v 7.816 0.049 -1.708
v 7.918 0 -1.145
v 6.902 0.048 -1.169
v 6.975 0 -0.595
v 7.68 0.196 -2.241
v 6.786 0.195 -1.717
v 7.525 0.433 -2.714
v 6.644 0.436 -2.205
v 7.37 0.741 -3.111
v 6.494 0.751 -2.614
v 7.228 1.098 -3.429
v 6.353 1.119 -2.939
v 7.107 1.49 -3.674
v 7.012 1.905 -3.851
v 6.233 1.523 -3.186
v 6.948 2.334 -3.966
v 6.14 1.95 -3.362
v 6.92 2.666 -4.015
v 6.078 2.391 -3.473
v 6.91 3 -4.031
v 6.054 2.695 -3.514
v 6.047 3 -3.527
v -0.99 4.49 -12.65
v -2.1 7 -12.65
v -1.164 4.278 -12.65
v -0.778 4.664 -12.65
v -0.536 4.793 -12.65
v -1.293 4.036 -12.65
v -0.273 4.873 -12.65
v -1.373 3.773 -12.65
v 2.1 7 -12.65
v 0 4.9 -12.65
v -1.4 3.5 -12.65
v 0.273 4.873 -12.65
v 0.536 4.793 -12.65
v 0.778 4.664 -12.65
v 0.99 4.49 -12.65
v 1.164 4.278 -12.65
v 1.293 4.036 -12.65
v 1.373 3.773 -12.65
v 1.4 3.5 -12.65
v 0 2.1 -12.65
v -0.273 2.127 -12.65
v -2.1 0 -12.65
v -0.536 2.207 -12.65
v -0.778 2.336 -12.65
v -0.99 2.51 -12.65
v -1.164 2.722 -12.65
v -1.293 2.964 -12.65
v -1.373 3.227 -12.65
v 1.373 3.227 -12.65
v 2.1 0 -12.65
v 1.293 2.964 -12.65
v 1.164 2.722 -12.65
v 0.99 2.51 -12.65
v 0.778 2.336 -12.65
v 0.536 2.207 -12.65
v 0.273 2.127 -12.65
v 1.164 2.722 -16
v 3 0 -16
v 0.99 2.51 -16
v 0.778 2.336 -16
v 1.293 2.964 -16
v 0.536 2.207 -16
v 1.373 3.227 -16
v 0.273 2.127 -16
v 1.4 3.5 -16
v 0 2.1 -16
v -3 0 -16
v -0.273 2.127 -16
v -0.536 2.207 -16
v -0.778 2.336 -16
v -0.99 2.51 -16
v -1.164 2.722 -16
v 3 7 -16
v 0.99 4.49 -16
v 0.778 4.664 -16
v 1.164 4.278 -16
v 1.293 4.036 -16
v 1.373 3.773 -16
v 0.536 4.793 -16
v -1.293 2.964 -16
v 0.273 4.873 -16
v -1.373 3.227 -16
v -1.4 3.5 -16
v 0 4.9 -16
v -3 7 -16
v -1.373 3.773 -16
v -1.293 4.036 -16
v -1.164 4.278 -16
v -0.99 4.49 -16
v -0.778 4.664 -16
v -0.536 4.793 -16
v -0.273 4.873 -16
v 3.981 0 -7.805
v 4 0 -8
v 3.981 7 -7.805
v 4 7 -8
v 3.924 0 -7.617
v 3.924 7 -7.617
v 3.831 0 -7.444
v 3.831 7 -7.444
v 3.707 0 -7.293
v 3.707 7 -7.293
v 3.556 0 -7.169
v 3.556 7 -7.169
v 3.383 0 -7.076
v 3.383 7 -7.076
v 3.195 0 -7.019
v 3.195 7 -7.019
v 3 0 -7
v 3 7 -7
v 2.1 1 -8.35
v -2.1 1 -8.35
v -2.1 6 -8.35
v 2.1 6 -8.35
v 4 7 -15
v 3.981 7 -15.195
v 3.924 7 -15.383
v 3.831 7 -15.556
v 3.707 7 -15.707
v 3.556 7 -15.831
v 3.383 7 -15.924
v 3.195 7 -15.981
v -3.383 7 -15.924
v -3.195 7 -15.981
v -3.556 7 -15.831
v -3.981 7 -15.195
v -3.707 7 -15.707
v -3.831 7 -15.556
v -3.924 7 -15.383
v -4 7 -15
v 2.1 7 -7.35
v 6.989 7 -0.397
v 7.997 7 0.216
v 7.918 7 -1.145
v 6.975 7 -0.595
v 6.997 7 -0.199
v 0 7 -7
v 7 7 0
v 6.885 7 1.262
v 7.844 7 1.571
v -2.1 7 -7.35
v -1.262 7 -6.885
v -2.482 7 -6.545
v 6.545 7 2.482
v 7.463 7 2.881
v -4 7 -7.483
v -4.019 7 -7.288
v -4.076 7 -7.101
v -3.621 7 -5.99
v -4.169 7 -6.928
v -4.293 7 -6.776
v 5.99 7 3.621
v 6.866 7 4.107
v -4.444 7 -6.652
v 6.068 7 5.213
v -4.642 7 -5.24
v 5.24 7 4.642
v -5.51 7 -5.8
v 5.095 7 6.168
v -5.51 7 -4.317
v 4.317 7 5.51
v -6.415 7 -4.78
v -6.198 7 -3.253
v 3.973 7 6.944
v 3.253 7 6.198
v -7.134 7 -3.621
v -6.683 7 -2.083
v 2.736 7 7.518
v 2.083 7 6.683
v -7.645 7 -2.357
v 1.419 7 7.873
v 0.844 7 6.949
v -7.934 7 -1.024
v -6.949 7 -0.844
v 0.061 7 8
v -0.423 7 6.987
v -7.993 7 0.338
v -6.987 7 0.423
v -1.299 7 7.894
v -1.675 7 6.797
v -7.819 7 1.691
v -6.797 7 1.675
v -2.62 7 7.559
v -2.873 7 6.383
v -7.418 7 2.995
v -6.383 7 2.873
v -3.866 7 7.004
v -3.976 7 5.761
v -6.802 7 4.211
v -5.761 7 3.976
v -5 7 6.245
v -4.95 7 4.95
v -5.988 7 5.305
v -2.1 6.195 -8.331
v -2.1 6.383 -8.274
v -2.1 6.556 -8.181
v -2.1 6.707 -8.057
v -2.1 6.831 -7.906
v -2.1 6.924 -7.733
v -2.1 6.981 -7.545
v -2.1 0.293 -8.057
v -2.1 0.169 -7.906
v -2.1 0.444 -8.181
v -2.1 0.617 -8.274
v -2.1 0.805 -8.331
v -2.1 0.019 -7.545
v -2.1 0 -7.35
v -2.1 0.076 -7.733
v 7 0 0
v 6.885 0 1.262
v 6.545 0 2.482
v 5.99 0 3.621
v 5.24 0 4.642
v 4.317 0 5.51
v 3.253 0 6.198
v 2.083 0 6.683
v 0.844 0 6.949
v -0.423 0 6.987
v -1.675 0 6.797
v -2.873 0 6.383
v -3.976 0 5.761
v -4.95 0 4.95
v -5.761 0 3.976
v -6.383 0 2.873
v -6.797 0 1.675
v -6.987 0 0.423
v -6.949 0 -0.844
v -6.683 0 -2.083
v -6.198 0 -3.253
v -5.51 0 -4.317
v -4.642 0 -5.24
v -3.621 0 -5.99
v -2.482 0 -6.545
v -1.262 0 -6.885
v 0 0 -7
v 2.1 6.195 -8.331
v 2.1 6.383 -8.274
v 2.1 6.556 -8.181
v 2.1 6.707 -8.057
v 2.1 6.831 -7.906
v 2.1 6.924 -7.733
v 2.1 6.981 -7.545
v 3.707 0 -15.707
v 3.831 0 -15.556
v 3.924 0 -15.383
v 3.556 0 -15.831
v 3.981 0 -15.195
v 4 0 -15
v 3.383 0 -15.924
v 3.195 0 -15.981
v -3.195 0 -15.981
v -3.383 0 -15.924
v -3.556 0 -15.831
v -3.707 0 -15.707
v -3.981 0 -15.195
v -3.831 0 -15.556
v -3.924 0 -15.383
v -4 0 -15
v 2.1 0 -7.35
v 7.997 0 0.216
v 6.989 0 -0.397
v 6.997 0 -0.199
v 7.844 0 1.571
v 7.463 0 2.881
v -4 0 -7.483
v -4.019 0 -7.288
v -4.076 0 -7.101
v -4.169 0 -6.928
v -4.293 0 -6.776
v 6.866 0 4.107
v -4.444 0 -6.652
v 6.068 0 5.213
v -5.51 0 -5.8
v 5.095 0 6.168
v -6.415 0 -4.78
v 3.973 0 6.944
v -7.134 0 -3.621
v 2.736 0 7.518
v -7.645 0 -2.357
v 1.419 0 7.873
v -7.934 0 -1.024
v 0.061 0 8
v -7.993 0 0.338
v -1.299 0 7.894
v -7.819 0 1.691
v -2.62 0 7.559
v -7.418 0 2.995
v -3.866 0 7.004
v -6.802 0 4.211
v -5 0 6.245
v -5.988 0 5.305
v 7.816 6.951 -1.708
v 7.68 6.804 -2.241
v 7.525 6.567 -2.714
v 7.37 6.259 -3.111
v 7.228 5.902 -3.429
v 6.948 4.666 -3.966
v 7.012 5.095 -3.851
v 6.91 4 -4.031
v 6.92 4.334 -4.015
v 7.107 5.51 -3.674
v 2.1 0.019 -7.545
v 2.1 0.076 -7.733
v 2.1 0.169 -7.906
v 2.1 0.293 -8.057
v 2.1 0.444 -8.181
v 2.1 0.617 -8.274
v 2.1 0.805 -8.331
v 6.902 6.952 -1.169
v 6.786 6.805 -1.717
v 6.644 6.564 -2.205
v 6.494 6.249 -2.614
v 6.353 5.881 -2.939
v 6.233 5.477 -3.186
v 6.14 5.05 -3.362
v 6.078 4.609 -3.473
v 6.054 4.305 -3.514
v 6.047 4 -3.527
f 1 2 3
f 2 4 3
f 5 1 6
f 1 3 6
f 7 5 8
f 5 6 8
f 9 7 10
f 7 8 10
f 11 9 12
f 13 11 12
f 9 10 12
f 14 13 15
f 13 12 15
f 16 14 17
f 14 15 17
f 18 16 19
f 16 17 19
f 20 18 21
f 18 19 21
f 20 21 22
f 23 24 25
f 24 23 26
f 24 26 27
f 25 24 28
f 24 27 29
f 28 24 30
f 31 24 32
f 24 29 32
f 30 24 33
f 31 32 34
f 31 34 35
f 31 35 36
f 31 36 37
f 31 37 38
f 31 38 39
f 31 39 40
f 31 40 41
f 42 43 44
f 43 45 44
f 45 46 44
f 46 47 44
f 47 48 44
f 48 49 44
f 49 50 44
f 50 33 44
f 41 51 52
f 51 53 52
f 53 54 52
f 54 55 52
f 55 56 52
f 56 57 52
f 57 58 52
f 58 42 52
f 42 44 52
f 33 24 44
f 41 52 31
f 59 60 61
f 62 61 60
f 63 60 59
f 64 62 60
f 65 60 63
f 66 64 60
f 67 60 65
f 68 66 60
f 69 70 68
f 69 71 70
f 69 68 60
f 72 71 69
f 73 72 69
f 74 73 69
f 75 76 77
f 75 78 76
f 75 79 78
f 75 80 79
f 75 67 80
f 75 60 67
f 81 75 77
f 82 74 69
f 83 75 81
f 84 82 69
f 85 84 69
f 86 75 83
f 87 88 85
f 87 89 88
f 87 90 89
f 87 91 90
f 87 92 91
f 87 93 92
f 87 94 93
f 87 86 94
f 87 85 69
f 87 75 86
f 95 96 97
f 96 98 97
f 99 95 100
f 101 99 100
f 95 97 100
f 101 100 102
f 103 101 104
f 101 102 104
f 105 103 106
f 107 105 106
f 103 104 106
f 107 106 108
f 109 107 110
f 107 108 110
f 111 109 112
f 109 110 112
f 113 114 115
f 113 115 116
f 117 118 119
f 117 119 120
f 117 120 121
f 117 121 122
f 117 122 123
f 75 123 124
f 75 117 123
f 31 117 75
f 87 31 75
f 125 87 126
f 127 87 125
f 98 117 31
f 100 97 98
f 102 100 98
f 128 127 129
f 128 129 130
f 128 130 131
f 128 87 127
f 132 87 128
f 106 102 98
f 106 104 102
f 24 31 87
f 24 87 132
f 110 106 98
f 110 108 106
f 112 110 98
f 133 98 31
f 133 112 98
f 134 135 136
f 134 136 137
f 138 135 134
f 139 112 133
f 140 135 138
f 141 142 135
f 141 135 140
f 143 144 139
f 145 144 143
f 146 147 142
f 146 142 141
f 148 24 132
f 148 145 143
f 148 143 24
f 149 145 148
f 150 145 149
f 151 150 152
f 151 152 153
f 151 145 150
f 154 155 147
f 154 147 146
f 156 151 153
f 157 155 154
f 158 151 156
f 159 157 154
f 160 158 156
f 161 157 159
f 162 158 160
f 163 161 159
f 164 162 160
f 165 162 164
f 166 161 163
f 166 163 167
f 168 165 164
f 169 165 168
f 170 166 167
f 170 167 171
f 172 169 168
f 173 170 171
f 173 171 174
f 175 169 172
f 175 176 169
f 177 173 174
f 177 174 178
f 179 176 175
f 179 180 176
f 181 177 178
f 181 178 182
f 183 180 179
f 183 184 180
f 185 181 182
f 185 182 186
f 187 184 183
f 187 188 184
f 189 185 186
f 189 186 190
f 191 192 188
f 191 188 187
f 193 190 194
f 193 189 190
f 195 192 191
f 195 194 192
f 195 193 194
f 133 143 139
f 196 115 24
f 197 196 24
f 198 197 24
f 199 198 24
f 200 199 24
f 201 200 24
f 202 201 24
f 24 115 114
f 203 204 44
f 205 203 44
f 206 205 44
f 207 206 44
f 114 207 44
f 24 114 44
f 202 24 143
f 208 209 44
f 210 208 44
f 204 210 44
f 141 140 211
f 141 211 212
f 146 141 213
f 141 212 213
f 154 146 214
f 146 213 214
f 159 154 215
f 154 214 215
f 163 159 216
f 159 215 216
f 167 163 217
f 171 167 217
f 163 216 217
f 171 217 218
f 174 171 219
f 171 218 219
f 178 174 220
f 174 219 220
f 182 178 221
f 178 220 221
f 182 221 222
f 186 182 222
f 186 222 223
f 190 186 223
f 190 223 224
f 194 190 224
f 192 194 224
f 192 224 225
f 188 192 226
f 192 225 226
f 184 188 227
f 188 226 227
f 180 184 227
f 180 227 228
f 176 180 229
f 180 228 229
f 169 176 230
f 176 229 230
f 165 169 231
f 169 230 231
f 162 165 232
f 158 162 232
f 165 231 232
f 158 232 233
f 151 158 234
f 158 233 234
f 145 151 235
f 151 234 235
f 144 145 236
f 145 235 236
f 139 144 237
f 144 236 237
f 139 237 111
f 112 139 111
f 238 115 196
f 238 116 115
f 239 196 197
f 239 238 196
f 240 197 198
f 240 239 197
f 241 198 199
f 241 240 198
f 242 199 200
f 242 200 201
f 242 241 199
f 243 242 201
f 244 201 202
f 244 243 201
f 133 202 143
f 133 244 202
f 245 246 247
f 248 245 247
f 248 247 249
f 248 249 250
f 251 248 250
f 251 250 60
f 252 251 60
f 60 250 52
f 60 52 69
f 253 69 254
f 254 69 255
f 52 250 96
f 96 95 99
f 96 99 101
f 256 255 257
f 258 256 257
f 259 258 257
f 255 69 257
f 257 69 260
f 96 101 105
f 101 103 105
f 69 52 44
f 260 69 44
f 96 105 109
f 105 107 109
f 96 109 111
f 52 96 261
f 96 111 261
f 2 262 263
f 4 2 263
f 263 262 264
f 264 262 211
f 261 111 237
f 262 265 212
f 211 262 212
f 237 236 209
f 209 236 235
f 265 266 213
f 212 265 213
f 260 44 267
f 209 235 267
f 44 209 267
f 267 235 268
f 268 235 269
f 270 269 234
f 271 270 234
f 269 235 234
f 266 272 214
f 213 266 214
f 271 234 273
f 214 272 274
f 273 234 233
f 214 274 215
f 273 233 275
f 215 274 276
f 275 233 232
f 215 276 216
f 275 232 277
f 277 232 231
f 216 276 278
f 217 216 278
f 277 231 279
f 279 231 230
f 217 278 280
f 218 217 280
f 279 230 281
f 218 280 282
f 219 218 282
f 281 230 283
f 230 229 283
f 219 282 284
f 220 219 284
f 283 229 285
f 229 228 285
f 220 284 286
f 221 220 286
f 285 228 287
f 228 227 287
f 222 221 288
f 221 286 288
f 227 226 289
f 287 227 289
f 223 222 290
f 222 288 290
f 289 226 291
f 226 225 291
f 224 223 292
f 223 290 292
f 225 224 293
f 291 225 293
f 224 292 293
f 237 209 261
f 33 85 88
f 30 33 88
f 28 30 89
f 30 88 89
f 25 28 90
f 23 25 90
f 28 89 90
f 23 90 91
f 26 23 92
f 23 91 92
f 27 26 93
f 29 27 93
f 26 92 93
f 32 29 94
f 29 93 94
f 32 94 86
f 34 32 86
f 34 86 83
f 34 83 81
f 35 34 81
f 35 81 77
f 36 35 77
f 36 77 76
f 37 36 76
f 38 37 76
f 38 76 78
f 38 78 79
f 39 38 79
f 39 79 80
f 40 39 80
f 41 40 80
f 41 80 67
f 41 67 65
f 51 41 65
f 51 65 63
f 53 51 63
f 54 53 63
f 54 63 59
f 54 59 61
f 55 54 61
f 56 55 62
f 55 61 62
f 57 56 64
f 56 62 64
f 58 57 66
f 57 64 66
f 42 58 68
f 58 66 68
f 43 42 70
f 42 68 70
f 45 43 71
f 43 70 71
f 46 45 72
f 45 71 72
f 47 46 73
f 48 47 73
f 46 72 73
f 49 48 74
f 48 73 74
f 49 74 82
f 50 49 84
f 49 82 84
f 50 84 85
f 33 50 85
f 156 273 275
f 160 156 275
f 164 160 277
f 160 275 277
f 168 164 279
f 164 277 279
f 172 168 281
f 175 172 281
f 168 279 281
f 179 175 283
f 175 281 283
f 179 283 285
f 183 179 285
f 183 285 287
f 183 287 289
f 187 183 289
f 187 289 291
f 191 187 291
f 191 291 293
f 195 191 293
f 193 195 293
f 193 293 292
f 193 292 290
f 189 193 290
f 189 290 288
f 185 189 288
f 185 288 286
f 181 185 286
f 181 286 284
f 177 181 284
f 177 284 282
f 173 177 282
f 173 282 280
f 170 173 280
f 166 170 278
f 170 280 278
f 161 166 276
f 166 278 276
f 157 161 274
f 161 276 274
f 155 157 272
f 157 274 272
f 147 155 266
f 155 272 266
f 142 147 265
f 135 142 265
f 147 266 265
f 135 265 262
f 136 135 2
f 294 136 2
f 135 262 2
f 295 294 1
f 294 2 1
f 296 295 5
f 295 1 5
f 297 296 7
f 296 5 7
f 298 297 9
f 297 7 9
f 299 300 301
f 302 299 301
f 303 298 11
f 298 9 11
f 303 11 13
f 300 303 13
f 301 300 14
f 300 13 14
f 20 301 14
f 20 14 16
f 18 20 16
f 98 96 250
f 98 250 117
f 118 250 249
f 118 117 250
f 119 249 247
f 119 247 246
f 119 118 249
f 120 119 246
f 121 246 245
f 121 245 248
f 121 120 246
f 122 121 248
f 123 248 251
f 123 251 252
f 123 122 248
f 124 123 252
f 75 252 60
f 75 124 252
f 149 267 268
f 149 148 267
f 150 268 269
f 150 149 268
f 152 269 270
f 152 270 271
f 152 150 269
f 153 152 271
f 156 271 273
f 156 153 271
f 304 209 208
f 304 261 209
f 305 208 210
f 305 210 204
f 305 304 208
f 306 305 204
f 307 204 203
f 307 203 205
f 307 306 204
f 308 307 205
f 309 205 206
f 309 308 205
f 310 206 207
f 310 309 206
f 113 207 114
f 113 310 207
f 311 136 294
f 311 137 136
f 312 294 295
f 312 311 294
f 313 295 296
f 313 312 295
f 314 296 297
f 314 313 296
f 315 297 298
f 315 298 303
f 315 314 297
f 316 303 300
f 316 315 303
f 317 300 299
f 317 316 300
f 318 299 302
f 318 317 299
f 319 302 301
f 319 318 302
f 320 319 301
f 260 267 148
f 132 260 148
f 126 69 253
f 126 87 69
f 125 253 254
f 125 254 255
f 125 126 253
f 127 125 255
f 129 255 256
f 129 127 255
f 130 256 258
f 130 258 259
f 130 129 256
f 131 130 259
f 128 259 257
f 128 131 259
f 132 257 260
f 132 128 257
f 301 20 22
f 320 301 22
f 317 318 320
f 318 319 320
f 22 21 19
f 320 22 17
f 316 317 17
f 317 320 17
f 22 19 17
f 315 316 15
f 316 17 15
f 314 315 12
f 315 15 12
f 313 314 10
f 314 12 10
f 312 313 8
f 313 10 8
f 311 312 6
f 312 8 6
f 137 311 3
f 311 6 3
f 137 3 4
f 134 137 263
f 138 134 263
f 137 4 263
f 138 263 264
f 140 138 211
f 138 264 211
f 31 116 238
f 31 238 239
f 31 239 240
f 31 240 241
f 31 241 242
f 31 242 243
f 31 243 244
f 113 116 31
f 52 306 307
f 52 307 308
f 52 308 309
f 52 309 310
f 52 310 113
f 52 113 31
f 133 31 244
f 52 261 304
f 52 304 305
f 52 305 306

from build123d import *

# Parameters (mm, degrees)
SKETCH1_W           = 4.2
SKETCH1_H           = 4.3
BOSS_EXTRUDE1_DEPTH = 7
FILLET1_R           = 1
FILLET2_R           = 3
FILLET3_R           = 1
SKETCH3_W           = 8
SKETCH3_H           = 7
BOSS_EXTRUDE2_DEPTH = 2
SKETCH2_R           = 1.4
CUT_EXTRUDE2_DEPTH  = 4
FILLET4_R           = 1


with BuildPart() as part:
    # Sketch1 → Boss-Extrude1 (new body)
    # profile 1 of 2: a face of its own
    with BuildSketch(Plane(origin=(0, 0, 0), x_dir=(1, 0, 0), z_dir=(0, 1, 0))):
        with BuildLine():
            ThreePointArc((7, 0), (-4.949747468, -4.949747468), (0, 7))
            Line((0, 7), (3.872983346, 7))
            Line((3.872983346, 7), (4, 7))
            Line((4, 7), (4, 14))
            Line((4, 14), (-4, 14))
            Line((-4, 14), (-4, 7))
            Line((-4, 7), (-3.872983346, 7))
            ThreePointArc((-3.872983346, 7), (-3.936655355, 6.964391188), (-4, 6.92820323))
            ThreePointArc((-4, 6.92820323), (-2.053343481, -7.73199719), (6.910323964, 4.030809189))
            Line((6.910323964, 4.030809189), (6.046533468, 3.52695804))
            ThreePointArc((6.046533468, 3.52695804), (6.757430513, 1.826782105), (7, 0))
        make_face()
        with Locations((0, 10.5)):
            Rectangle(SKETCH1_W, SKETCH1_H, mode=Mode.SUBTRACT)
    # profile 2 of 2: a face of its own
    with BuildSketch(Plane(origin=(0, 0, 0), x_dir=(1, 0, 0), z_dir=(0, 1, 0))):
        with BuildLine():
            Line((-4, 7), (-4, 6.92820323))
            ThreePointArc((-4, 6.92820323), (-3.936655355, 6.964391188), (-3.872983346, 7))
            Line((-3.872983346, 7), (-4, 7))
        make_face()
    extrude(amount=BOSS_EXTRUDE1_DEPTH)

    # Fillet1
    fillet1_edges = [part.edges().sort_by_distance(p)[0] for p in [
        (4, 3.5, -7),
        (-4, 3.5, -6.92820323),
    ]]
    fillet(fillet1_edges, radius=FILLET1_R)

    # Fillet2
    fillet2_edges = [part.edges().sort_by_distance(p)[0] for p in [
        (6.478428716, 0, -3.778883614),
        (6.478428716, 7, -3.778883614),
    ]]
    fillet(fillet2_edges, radius=FILLET2_R)

    # Fillet3
    fillet3_edges = [part.edges().sort_by_distance(p)[0] for p in [
        (0, 7, -8.35),
        (0, 0, -8.35),
    ]]
    fillet(fillet3_edges, radius=FILLET3_R)

    # Sketch3 → Boss-Extrude2 (add)
    with BuildSketch(Plane(origin=(0, 0, -14), x_dir=(-1, 0, 0), z_dir=(0, 0, -1))):
        with Locations((0, 3.5)):
            Rectangle(SKETCH3_W, SKETCH3_H)
    extrude(amount=BOSS_EXTRUDE2_DEPTH)

    # Sketch2 → Cut-Extrude2 (cut)
    with BuildSketch(Plane(origin=(0, 0, -16), x_dir=(-1, 0, 0), z_dir=(0, 0, -1))):
        with Locations((0, 3.5)):
            Circle(SKETCH2_R)
    extrude(amount=-CUT_EXTRUDE2_DEPTH, mode=Mode.SUBTRACT)

    # Fillet4
    fillet4_edges = [part.edges().sort_by_distance(p)[0] for p in [
        (4, 3.5, -16),
        (-4, 3.5, -16),
    ]]
    fillet(fillet4_edges, radius=FILLET4_R)


solid = part.part
